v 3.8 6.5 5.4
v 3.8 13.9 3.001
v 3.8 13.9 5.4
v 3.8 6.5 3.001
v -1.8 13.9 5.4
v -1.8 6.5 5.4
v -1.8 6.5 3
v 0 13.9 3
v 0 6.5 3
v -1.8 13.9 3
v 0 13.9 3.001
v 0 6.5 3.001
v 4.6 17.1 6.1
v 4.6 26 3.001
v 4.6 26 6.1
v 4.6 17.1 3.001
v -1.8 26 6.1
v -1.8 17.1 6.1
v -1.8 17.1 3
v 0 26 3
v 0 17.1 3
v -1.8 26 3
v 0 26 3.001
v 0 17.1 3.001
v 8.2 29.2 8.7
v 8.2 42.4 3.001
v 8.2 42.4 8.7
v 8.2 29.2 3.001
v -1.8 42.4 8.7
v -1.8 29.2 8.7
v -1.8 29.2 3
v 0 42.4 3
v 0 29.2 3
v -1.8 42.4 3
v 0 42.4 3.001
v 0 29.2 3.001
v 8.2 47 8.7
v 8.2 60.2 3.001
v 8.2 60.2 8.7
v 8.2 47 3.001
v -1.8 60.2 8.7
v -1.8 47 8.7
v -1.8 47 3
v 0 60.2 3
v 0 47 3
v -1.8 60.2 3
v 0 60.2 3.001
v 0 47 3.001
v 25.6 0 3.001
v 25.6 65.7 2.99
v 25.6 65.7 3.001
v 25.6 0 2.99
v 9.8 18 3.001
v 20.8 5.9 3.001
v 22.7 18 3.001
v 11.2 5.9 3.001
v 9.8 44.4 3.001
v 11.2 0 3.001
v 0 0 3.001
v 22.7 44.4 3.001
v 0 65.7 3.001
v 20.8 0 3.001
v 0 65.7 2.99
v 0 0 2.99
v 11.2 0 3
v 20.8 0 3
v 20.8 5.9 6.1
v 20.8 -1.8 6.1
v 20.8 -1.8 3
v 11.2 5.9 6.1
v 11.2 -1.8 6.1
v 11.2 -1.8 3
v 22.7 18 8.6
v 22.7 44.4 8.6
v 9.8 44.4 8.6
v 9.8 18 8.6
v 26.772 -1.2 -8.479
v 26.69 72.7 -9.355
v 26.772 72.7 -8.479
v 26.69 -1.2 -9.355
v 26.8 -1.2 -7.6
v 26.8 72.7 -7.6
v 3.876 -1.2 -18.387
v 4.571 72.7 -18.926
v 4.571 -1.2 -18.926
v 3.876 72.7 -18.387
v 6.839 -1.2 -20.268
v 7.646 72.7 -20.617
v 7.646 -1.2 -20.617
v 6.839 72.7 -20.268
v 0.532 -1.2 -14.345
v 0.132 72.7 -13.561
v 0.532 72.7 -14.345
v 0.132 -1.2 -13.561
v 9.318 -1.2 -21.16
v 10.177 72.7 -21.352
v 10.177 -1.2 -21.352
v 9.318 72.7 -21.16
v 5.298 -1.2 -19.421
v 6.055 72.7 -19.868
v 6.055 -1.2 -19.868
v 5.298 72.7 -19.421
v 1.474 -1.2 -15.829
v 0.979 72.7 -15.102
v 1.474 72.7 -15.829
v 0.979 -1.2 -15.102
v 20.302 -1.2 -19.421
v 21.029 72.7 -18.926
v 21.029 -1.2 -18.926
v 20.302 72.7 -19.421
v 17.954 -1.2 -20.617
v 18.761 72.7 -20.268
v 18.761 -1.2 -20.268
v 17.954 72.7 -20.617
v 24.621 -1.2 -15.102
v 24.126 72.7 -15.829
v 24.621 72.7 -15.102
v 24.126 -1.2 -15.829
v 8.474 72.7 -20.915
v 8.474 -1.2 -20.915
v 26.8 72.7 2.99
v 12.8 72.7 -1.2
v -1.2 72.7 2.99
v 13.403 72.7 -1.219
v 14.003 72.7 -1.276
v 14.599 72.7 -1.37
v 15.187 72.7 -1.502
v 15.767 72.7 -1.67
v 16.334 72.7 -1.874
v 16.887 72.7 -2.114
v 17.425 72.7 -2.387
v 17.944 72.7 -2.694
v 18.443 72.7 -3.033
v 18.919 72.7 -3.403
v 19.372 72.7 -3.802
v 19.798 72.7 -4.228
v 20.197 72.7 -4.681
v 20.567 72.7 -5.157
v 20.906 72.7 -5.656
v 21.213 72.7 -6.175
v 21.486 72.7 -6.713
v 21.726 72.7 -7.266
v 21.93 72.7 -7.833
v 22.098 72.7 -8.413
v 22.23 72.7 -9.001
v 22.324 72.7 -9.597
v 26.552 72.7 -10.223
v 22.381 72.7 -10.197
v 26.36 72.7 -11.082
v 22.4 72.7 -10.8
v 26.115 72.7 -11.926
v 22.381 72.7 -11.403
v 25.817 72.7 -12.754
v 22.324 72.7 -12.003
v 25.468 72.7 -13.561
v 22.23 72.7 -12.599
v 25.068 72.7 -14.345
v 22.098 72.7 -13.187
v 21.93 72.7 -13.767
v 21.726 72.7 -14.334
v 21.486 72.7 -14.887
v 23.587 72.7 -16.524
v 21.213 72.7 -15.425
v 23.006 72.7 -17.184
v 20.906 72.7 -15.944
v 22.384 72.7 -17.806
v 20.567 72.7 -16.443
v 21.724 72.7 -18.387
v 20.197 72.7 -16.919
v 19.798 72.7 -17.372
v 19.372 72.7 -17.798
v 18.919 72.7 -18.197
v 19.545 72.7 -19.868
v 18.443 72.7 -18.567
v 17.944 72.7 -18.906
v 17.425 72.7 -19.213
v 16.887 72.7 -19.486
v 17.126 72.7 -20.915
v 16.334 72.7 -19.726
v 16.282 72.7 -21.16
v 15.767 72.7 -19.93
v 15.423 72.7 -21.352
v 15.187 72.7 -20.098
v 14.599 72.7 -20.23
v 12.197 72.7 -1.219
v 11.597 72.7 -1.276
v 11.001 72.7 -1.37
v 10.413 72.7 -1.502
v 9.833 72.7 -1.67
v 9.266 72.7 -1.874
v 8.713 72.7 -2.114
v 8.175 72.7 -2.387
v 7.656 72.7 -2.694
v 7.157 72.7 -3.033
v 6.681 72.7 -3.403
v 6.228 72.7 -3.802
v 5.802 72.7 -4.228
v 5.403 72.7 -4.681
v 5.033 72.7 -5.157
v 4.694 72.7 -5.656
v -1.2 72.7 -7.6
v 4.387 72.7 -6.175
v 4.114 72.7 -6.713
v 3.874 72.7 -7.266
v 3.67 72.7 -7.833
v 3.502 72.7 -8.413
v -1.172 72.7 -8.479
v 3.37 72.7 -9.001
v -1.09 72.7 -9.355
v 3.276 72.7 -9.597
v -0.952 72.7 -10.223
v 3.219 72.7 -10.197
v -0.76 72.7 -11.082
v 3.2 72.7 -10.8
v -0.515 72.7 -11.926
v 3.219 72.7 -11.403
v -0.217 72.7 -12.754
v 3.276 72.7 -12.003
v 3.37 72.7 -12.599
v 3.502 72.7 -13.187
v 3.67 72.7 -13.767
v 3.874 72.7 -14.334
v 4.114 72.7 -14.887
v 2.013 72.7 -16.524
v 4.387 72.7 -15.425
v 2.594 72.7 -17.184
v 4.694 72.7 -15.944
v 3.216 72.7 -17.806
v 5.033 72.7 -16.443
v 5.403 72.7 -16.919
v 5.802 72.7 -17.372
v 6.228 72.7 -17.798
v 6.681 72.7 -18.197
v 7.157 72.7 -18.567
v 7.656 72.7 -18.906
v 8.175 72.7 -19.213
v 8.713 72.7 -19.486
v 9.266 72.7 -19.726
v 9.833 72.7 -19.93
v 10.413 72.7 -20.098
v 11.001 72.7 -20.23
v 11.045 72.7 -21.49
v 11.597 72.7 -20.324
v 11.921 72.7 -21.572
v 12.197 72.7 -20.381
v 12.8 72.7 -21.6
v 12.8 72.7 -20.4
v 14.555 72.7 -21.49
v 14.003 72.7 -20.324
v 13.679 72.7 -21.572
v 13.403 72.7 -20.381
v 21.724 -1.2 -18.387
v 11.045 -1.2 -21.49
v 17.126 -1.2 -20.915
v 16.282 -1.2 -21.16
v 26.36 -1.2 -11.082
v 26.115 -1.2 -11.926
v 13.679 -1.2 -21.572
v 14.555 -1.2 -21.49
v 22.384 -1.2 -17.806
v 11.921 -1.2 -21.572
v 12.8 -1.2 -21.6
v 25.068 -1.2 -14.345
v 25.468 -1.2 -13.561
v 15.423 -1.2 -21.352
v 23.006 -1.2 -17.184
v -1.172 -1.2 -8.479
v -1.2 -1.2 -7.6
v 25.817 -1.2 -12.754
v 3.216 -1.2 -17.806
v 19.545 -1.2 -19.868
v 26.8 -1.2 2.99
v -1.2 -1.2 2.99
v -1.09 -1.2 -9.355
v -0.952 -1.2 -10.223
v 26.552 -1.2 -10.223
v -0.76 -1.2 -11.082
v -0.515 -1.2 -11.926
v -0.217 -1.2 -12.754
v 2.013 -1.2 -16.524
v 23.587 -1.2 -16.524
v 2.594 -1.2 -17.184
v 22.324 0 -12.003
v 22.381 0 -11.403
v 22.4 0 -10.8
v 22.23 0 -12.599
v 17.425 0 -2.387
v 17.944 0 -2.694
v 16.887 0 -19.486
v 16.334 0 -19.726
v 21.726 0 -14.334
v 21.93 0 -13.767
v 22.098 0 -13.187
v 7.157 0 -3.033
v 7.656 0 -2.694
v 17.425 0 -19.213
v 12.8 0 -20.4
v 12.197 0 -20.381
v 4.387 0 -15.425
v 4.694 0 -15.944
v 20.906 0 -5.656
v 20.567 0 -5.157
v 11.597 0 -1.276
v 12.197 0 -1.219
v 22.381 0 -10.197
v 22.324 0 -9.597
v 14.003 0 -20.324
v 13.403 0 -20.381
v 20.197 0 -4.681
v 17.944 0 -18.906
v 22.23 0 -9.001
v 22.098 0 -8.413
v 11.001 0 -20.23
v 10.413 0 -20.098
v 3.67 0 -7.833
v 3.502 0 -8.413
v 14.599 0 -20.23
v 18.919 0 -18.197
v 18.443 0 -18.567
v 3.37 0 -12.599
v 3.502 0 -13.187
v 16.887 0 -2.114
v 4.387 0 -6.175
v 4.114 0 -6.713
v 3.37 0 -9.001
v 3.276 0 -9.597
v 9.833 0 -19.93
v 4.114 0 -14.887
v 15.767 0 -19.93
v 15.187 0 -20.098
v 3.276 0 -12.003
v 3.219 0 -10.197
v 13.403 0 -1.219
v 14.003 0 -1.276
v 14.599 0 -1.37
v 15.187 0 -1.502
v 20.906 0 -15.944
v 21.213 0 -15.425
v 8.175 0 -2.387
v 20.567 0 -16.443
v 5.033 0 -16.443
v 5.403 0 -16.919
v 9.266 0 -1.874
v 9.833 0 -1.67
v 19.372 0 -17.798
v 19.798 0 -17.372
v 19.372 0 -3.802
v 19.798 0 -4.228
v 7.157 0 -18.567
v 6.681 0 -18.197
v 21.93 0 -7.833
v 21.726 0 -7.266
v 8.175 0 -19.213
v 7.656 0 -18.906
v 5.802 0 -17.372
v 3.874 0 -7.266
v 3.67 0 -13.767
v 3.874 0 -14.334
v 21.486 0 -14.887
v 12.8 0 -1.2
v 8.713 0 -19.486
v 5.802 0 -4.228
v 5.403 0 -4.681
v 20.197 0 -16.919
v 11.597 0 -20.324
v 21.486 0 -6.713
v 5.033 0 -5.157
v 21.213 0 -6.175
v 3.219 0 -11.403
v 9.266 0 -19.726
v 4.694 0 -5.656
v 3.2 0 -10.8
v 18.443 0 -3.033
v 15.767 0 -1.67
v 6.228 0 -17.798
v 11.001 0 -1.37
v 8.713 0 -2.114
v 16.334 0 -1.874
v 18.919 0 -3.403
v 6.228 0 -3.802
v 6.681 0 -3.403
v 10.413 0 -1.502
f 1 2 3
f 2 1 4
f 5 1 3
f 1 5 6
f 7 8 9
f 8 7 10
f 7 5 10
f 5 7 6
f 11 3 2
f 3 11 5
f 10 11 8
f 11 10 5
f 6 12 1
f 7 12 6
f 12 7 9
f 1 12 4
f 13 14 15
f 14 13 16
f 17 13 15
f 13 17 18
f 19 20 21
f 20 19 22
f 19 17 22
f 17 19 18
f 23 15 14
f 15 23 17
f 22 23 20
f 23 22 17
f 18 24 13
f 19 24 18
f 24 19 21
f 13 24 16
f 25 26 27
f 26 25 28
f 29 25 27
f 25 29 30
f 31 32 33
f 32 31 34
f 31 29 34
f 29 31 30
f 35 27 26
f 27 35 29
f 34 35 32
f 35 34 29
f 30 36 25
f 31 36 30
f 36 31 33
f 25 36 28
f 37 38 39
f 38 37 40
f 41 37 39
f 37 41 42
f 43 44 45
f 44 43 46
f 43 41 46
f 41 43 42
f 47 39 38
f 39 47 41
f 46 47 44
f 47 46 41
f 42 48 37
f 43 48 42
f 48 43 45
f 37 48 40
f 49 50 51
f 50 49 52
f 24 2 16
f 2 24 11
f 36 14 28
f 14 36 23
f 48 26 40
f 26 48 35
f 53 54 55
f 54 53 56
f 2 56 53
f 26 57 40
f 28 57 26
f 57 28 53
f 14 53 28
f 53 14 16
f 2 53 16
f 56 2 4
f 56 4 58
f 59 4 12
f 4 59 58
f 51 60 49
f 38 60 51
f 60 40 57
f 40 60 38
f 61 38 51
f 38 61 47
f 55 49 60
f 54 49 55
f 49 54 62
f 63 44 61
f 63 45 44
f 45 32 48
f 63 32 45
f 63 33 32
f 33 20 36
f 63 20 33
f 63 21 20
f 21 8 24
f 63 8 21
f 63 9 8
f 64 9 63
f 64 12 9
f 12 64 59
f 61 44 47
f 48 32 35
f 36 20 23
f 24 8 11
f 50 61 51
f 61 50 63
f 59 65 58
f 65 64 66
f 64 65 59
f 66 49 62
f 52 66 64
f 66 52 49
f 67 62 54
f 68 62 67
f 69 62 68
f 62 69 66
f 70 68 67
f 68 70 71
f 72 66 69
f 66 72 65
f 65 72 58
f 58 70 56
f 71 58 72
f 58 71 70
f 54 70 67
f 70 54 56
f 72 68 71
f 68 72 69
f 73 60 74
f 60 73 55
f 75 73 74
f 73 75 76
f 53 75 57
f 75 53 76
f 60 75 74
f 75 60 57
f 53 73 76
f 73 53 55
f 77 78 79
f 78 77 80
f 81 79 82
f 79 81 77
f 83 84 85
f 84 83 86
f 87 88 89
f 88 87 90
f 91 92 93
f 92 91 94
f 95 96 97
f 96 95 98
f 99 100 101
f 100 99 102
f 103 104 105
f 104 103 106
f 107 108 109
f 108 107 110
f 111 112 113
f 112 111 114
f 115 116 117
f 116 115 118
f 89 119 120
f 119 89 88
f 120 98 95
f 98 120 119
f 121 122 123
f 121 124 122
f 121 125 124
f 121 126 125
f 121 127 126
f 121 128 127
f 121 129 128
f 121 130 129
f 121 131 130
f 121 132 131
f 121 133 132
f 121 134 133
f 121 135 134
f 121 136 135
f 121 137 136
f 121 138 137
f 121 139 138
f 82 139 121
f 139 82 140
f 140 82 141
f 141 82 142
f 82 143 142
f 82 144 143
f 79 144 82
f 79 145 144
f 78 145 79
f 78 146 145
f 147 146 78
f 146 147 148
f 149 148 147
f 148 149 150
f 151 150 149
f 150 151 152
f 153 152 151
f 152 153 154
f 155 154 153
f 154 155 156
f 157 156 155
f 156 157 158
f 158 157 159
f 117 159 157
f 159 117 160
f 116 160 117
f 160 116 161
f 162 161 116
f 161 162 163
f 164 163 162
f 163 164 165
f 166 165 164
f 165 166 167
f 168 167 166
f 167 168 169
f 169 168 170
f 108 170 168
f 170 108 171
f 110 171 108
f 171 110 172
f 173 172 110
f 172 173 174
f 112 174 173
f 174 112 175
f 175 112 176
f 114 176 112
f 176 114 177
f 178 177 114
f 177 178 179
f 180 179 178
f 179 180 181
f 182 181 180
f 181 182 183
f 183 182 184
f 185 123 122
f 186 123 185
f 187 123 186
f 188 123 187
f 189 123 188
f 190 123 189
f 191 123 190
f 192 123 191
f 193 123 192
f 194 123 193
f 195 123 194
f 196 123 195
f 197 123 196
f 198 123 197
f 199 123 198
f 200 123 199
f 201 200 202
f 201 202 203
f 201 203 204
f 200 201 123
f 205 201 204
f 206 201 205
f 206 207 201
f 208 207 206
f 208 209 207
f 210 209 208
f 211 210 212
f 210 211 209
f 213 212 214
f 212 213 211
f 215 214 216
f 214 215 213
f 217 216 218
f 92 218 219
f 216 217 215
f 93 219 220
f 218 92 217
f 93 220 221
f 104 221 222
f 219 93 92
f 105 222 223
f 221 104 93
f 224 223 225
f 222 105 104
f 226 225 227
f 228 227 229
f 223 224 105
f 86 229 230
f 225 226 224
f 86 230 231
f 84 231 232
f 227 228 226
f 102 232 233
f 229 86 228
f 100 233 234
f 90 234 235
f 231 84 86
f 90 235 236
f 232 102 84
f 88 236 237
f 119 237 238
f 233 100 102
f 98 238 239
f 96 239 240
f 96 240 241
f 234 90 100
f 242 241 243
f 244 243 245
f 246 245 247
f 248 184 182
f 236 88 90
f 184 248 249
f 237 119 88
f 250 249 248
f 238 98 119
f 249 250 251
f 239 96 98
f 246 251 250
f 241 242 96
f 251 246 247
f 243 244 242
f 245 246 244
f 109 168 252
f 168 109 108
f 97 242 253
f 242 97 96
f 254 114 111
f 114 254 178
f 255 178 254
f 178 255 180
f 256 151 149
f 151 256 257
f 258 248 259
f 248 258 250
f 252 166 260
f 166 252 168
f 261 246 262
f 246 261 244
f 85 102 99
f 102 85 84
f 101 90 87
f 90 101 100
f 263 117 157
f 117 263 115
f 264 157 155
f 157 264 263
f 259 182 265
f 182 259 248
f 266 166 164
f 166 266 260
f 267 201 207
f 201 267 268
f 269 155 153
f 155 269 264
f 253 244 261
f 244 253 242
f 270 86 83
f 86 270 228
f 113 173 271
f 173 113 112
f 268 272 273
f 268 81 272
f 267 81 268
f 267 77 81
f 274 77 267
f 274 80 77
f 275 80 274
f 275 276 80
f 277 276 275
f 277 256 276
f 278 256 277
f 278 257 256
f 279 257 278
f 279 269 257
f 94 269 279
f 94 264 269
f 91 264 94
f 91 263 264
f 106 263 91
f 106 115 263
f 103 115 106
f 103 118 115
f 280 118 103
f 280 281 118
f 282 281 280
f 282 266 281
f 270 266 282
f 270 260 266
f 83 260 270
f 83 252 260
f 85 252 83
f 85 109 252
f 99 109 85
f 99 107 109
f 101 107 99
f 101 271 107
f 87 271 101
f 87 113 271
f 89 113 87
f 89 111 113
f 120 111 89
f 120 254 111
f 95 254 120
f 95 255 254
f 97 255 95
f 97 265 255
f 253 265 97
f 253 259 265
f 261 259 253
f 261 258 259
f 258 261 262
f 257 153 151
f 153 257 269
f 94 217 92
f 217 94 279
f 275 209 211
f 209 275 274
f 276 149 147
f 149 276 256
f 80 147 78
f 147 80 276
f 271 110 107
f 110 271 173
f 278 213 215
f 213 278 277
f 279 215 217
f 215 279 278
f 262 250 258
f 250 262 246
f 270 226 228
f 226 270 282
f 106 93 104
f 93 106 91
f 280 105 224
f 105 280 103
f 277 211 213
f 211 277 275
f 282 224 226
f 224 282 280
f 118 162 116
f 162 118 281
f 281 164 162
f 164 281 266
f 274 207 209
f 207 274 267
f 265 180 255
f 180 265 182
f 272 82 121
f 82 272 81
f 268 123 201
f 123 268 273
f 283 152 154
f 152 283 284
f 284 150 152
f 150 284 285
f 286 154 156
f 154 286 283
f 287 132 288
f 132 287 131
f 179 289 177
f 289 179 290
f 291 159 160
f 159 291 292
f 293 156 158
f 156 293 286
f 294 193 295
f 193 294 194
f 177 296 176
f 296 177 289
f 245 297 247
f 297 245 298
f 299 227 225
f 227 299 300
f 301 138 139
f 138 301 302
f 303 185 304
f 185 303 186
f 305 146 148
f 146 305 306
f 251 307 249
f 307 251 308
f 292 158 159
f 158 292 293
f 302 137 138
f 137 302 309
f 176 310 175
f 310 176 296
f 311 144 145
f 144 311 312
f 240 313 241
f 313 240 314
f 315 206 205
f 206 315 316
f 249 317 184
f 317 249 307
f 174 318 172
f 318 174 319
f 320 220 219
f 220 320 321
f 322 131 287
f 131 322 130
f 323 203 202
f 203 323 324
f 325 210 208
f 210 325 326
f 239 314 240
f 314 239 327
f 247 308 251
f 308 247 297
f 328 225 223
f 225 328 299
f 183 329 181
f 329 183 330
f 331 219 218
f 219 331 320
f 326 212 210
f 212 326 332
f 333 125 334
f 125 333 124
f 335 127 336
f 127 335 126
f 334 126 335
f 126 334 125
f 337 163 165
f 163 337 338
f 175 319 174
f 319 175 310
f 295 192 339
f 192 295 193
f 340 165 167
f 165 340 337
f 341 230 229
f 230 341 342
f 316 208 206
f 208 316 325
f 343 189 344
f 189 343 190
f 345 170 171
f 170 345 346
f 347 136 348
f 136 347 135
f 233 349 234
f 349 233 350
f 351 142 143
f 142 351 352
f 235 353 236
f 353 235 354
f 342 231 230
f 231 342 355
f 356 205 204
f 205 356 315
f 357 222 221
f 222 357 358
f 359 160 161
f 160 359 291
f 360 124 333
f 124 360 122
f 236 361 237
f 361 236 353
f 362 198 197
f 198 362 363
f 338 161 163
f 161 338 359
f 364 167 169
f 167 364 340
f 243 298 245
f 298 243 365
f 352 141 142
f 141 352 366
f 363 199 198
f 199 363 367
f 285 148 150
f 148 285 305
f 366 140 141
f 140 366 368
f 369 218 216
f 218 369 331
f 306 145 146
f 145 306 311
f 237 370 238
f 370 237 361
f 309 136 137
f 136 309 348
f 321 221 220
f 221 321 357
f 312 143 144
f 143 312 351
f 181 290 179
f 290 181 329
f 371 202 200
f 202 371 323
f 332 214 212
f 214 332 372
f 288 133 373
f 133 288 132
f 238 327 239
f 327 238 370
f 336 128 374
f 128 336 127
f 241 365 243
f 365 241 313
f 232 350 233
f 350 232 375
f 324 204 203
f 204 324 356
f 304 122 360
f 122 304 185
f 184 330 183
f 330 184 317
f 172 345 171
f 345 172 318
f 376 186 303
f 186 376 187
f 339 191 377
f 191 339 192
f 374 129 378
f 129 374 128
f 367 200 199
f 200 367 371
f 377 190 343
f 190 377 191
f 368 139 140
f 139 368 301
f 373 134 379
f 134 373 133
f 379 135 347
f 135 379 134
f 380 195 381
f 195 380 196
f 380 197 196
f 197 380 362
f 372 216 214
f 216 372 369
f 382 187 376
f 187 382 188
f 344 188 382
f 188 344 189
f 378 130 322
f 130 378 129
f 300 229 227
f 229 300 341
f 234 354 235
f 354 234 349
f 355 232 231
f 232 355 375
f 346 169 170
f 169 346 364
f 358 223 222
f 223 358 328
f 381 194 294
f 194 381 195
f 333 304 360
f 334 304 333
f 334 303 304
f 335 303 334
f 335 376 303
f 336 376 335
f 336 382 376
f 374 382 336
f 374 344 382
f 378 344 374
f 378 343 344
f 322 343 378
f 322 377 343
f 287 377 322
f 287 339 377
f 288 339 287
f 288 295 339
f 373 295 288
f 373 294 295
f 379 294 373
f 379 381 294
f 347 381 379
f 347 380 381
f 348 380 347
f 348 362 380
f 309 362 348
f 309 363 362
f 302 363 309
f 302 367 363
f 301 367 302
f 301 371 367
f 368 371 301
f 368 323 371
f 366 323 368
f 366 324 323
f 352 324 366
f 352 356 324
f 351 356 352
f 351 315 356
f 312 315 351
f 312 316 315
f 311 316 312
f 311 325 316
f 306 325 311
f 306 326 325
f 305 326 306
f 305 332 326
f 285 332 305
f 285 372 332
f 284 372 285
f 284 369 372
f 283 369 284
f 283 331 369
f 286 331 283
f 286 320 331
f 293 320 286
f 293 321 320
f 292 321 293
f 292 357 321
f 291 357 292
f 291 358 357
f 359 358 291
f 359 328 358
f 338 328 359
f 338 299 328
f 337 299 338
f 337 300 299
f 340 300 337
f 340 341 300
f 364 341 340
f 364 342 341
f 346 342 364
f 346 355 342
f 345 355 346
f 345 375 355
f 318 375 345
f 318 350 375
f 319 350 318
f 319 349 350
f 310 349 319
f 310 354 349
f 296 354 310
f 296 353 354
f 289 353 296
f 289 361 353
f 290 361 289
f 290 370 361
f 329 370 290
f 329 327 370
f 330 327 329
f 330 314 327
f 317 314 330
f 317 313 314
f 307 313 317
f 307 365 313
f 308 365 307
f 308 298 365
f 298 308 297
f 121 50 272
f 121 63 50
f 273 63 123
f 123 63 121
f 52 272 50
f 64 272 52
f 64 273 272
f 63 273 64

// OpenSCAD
bat_d = 18.2+1; bat_l = 64.5 + 7;

board_w = 25.6;    board_l = 65.7;      board_h = 3;
musb_w = 5.6;      musb_l = 7.4;        musb_h = 2.4;      musb_y = 6.5;
usbc_w = 6.4;      usbc_l = 8.9;        usbc_h = 3.1;      usbc_y = 17.1;
usba_w = 10;       usba_l = 13.2;       usba_h = 5.7;      usba_y = [29.2, 47];
disp_w = 12.9;     disp_l = 26.4;       disp_h = 5.6; disp_y = 18; disp_x = 9.8;
lightning_w = 7.7; lightning_l = 9.6;   lightning_h = 3.1; lightning_x = 11.2;
ports_overlap = 1.8;
wall_thickness = 1.2;

$fn=100;

// board and bat
union() {
  // main board
  cube([board_w, board_l, board_h+0.001]);

  // front components
  translate([-ports_overlap,0,board_h]) {
    translate([0,musb_y,0])
    cube([musb_w, musb_l, musb_h]);

    translate([0,usbc_y,0])
    cube([usbc_w, usbc_l, usbc_h]);

    translate([0,usba_y[0],0])
    cube([usba_w, usba_l, usba_h]);

    translate([0,usba_y[1],0])
    cube([usba_w, usba_l, usba_h]);
  }

  // bottom components
  translate([0, -ports_overlap, board_h]) {
    translate([lightning_x,0,0])
    cube([lightning_l, lightning_w, lightning_h]);
  }

  // display
  translate([0,0, board_h]) {
    translate([disp_x,disp_y,0])
    cube([disp_w, disp_l, disp_h]);
  }
}

color([.25, .5, 0, .5])
difference() {
  // outer
  translate([board_w/2, -wall_thickness, board_w/2 - bat_d - wall_thickness])
  union() {
    rotate([-90, 0, 0])
    cylinder(d=board_w + 2*wall_thickness, h=bat_l + 2*wall_thickness);

    translate([-(board_w/2 + wall_thickness),0,0])
    cube([board_w + 2*wall_thickness, bat_l + 2*wall_thickness, 30]);
  }

  // cutout
  union() {
    // battery
    scale([1, 2, 1])
    translate([board_w/2, 0, -bat_d/2 - wall_thickness])
    rotate([-90, 0, 0])
    cylinder(d=bat_d, h=bat_l);

    // main board
    cube([board_w, board_l, board_h+0.001]);

    // top
    translate([-4*wall_thickness, -4*wall_thickness, board_h-.01])
    cube([2*board_w, 2*board_l, 42]);
  }
}
